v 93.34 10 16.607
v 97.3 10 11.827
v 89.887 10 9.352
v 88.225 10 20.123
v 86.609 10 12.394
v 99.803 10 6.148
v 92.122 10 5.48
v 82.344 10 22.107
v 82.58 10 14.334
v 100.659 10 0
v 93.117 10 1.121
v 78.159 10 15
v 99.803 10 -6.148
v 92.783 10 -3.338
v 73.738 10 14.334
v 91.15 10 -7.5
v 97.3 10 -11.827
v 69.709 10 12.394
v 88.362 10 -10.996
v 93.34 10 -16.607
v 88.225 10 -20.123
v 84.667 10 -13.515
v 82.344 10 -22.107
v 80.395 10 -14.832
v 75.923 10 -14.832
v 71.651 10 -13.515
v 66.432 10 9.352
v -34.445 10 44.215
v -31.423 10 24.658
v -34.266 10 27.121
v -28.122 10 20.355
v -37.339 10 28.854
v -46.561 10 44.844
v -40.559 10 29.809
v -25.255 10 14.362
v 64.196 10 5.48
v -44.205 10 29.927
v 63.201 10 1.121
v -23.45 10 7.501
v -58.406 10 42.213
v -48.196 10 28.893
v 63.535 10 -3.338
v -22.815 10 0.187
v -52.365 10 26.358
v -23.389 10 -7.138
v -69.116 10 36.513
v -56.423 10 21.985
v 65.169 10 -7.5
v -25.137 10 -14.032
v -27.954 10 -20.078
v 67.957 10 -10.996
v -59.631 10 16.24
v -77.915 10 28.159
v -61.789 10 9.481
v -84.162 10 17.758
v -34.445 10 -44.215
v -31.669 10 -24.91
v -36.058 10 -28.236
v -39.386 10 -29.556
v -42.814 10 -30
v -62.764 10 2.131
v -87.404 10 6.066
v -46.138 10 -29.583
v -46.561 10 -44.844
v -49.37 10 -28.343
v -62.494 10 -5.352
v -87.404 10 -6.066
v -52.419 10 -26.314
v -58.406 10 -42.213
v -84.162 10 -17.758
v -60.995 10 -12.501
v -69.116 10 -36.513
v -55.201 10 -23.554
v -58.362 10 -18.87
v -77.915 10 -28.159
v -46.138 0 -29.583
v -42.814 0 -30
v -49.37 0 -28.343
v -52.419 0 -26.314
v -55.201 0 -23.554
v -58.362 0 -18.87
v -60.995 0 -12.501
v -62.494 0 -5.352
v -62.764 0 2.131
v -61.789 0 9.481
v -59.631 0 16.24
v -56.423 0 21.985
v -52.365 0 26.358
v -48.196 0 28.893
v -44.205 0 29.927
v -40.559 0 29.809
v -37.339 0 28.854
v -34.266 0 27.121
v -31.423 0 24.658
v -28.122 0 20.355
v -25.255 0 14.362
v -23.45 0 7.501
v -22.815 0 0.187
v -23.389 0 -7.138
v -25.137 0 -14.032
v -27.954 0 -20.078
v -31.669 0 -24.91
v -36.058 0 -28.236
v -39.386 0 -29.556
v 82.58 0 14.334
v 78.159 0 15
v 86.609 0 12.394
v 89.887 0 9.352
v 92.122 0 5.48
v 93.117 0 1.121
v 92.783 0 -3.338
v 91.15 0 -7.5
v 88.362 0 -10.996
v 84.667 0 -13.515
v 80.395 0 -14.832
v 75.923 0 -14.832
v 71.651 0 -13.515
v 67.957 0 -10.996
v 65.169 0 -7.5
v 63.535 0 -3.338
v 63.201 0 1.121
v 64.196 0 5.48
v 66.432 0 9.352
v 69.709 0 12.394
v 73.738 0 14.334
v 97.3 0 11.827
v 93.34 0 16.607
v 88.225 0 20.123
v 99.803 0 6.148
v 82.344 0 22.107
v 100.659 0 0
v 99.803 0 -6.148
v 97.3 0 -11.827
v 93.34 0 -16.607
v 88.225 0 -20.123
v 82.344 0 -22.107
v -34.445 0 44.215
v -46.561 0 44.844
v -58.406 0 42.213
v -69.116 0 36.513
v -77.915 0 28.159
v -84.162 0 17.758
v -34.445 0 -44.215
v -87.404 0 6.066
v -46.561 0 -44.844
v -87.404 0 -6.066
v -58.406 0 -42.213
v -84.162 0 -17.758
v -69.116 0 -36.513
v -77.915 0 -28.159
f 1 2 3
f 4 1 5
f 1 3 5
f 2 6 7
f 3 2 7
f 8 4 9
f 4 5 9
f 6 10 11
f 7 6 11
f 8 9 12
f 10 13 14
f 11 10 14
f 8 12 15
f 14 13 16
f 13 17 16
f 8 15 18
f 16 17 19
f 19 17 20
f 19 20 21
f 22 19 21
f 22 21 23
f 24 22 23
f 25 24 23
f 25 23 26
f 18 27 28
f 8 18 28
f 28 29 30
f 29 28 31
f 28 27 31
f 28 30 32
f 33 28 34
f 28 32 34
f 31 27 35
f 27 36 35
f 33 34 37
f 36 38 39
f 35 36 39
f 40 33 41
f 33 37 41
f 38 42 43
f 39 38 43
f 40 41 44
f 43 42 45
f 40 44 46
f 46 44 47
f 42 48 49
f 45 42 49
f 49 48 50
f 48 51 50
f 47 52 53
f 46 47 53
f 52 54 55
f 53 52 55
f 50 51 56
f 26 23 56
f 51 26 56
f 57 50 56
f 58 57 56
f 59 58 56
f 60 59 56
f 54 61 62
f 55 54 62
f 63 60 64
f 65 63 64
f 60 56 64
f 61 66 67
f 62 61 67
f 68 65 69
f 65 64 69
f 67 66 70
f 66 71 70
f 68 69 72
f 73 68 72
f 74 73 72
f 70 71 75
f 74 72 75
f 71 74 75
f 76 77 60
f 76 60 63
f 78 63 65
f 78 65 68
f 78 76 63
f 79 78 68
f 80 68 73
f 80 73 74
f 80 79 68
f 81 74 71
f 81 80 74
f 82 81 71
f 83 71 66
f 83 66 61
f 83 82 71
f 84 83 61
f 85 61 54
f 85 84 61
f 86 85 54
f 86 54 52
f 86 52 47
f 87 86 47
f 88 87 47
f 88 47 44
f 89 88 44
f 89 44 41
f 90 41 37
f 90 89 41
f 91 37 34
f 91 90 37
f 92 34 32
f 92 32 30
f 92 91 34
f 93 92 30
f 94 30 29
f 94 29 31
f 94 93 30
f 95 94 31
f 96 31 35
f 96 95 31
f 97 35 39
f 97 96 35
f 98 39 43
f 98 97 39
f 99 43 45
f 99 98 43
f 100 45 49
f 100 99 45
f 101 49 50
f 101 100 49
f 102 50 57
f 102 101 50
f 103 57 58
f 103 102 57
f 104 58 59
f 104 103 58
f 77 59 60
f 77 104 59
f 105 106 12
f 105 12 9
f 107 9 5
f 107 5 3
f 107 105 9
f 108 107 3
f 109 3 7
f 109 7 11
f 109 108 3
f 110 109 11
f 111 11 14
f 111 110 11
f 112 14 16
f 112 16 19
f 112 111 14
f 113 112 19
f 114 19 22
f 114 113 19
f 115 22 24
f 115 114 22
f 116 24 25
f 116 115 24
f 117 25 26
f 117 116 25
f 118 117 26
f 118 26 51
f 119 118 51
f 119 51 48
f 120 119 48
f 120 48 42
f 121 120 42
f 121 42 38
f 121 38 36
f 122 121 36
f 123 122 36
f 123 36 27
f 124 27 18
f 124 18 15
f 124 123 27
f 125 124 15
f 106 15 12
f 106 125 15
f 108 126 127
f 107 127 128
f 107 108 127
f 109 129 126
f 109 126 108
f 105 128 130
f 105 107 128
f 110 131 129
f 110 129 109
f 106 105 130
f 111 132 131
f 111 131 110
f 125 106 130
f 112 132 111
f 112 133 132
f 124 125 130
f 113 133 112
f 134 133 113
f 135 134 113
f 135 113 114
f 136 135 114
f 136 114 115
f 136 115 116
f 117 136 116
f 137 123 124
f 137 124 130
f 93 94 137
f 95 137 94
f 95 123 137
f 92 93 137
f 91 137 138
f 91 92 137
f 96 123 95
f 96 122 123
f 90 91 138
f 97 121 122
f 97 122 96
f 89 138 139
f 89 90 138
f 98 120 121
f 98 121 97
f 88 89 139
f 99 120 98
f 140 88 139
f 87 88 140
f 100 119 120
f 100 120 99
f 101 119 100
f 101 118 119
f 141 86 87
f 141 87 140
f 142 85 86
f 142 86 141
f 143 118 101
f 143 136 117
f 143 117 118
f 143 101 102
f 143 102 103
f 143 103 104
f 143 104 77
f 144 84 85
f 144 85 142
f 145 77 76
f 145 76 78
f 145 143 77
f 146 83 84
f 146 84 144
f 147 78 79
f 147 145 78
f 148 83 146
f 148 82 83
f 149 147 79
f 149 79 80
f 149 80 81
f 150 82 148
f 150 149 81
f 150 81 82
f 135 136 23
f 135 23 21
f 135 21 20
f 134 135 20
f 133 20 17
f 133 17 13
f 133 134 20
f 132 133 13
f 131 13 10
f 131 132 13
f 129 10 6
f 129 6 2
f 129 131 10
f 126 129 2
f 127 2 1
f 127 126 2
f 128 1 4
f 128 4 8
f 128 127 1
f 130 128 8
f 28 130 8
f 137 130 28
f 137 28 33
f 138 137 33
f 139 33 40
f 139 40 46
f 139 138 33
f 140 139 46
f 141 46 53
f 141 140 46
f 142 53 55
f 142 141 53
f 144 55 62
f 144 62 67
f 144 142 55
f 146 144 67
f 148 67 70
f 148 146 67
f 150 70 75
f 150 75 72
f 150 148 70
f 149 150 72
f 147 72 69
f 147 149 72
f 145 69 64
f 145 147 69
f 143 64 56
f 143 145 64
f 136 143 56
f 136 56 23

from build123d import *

# Parameters (mm, degrees)
SKETCH1_R           = 15
SKETCH1_RX          = 30
SKETCH1_RY          = 20
BOSS_EXTRUDE1_DEPTH = 10


with BuildPart() as part:
    # Sketch1 → Boss-Extrude1 (new body)
    with BuildSketch(Plane(origin=(0, 0, 0), x_dir=(1, 0, 0), z_dir=(0, 1, 0))):
        with BuildLine():
            Line((-34.444842367, 44.214814759), (82.343924077, 22.10740738))
            ThreePointArc((82.343924077, 22.10740738), (100.659125522, 0), (82.343924077, -22.10740738))
            Line((82.343924077, -22.10740738), (-34.444842367, -44.214814759))
            ThreePointArc((-34.444842367, -44.214814759), (-87.814439477, 0), (-34.444842367, 44.214814759))
        make_face()
        with Locations(Location((78.159125522, 0, 0), (0, 0, 270))):
            Circle(SKETCH1_R, mode=Mode.SUBTRACT)
        with Locations(Location((-42.814439477, 0), (0, 0, 90))):
            Ellipse(SKETCH1_RX, SKETCH1_RY, mode=Mode.SUBTRACT)
    extrude(amount=BOSS_EXTRUDE1_DEPTH)


solid = part.part
